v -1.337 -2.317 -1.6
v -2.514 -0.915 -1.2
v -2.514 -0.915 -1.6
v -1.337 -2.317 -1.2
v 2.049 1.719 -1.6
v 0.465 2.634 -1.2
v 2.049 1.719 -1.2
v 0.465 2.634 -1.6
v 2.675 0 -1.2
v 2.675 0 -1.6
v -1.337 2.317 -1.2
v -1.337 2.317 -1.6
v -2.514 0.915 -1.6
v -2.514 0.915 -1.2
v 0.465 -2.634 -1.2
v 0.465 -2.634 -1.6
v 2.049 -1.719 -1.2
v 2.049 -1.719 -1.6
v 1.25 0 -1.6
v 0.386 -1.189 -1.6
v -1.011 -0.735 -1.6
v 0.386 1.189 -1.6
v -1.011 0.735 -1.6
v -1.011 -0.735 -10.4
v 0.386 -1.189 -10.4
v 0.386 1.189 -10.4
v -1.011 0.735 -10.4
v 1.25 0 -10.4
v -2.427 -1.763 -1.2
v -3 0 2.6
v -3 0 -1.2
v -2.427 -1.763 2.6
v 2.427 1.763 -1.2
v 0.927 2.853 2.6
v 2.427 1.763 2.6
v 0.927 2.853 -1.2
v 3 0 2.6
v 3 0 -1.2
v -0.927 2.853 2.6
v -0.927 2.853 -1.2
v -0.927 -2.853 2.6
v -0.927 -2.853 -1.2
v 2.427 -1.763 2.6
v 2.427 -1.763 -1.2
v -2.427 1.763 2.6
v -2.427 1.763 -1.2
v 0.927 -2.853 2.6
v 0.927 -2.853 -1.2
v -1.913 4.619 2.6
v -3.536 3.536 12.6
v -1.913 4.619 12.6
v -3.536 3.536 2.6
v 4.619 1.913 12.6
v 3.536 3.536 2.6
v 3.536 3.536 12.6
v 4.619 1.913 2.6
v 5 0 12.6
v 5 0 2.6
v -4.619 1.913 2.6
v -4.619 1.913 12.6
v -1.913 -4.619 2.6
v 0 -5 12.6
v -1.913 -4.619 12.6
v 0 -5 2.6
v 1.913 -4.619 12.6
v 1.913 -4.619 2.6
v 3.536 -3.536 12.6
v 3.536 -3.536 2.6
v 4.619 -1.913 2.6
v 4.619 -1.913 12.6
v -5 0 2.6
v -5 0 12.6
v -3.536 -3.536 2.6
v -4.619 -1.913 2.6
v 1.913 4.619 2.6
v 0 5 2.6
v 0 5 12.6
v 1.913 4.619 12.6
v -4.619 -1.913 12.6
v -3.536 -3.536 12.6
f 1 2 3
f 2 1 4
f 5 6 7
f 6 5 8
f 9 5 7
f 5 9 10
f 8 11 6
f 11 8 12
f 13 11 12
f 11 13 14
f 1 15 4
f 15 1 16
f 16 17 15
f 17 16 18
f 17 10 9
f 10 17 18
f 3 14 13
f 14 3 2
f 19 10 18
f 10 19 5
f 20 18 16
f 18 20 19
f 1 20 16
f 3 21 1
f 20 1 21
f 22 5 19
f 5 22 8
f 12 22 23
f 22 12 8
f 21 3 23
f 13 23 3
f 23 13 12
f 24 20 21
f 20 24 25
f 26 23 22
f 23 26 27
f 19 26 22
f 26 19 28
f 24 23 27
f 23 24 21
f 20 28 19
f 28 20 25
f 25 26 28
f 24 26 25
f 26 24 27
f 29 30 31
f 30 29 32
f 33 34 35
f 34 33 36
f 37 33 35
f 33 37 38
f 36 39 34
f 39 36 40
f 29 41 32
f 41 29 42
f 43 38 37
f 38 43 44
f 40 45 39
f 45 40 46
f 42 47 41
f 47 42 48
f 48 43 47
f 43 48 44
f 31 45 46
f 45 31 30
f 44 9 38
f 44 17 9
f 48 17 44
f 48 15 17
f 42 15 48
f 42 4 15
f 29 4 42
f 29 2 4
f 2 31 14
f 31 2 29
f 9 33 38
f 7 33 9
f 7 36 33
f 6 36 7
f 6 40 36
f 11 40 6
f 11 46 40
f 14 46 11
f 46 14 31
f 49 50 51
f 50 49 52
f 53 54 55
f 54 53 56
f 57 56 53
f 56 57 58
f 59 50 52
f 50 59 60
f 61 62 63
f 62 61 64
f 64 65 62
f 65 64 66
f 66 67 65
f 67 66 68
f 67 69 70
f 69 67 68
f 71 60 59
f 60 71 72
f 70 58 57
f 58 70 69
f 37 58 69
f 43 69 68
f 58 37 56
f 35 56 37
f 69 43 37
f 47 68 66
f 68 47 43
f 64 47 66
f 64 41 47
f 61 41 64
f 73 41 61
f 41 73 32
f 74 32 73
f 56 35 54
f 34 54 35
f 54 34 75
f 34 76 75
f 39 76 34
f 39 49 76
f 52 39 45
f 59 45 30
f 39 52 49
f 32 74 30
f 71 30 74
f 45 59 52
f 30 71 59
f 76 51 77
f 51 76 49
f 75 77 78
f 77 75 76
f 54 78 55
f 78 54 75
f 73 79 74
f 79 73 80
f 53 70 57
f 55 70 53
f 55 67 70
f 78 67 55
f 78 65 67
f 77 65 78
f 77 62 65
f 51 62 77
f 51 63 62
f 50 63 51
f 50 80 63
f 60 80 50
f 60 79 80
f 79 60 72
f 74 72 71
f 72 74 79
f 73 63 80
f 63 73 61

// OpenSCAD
// Parameters
thread_diameter_mm = 2.5; //[1.25:5:0.05]
length_mm = 10; //[5:20:0.1]
head_diameter_mm = 5.35; //[2.675:10.7:0.05]
head_height_mm = 1.6; //[0.8:3.2:0.05]
tip_cone_height_mm = 0.8; //[0.4:1.6:0.05]
underhead_overlap_mm = 0.8; //[0.5:2:0.05]
drive_recess_enable = 1; //[0:1:1]
drive_recess_diameter_mm = 2.2; //[1.2:3.5:0.05]
drive_recess_depth_mm = 0.8; //[0.3:1.4:0.05]
dome_sphere_radius_factor = 1.2; //[0.8:2.0:0.05]
eps_mm = 0.2; //[0.05:0.5:0.05]

// Global overlap to guarantee physical connection between stacked parts
connect_overlap_mm = 1.2; // 1–2mm recommended

// Screw (dome head) - built as one connected solid
module screw() {
  color("DimGray")
  union() {
    // Coordinate convention:
    // Head spans z=[-head_height_mm, 0] (top at 0)
    // Shank starts slightly inside head and goes downward
    // Tip continues from shank with overlap

    // Head (with recess cut)
    difference() {
      union() {
        // Head base
        translate([0, 0, -head_height_mm/2])
          cylinder(h=head_height_mm, r=head_diameter_mm/2, center=true);

        // Dome cap (kept within head height envelope)
        intersection() {
          translate([0, 0, -head_height_mm + (head_diameter_mm/2)*dome_sphere_radius_factor])
            sphere(r=(head_diameter_mm/2)*dome_sphere_radius_factor);
          translate([0, 0, -head_height_mm/2])
            cube([head_diameter_mm*2, head_diameter_mm*2, head_height_mm], center=true);
        }
      }

      // Drive recess from top face downward
      if (drive_recess_enable) {
        translate([0, 0, -drive_recess_depth_mm/2 + eps_mm/2])
          cylinder(h=drive_recess_depth_mm + eps_mm, r=drive_recess_diameter_mm/2, center=true);
      }
    }

    // Shank: top of shank overlaps into head by connect_overlap_mm
    // Shank top plane should be at z = -head_height_mm + connect_overlap_mm
    translate([0, 0, (-head_height_mm + connect_overlap_mm) - length_mm/2])
      cylinder(h=length_mm, r=thread_diameter_mm/2, center=true);

    // Tip: overlaps into shank by connect_overlap_mm
    // Shank bottom plane is at z = (-head_height_mm + connect_overlap_mm) - length_mm
    // Tip top plane should be at shank bottom + connect_overlap_mm
    translate([0, 0, (-head_height_mm + connect_overlap_mm) - length_mm - tip_cone_height_mm/2 + connect_overlap_mm])
      cylinder(h=tip_cone_height_mm, r1=thread_diameter_mm/2, r2=0, center=true);
  }
}

// PCB Spacer (middle cylindrical segment) - attached to screw head with overlap
module pcb_spacer() {
  spacer_h = 5;
  spacer_r = 3;

  // Bottom of spacer overlaps into top of screw head (top of head at z=0)
  translate([0, 0, spacer_h/2 - connect_overlap_mm])
    color("Silver")
      cylinder(h=spacer_h, r=spacer_r, center=true);
}

// Buzzer (top large cylindrical segment) - attached to spacer with overlap
module buzzer() {
  buzzer_h = 10;
  buzzer_r = 5;
  spacer_h = 5;

  // Spacer top plane is at z = (spacer_h - connect_overlap_mm)
  // Place buzzer so its bottom overlaps into spacer by connect_overlap_mm
  translate([0, 0, (spacer_h - connect_overlap_mm) + buzzer_h/2 - connect_overlap_mm])
    color("Black")
      cylinder(h=buzzer_h, r=buzzer_r, center=true);
}

// Assembly: single connected solid (union) to eliminate floating/disconnected parts
module assembly() {
  union() {
    screw();
    pcb_spacer();
    buzzer();
  }
}

assembly();
